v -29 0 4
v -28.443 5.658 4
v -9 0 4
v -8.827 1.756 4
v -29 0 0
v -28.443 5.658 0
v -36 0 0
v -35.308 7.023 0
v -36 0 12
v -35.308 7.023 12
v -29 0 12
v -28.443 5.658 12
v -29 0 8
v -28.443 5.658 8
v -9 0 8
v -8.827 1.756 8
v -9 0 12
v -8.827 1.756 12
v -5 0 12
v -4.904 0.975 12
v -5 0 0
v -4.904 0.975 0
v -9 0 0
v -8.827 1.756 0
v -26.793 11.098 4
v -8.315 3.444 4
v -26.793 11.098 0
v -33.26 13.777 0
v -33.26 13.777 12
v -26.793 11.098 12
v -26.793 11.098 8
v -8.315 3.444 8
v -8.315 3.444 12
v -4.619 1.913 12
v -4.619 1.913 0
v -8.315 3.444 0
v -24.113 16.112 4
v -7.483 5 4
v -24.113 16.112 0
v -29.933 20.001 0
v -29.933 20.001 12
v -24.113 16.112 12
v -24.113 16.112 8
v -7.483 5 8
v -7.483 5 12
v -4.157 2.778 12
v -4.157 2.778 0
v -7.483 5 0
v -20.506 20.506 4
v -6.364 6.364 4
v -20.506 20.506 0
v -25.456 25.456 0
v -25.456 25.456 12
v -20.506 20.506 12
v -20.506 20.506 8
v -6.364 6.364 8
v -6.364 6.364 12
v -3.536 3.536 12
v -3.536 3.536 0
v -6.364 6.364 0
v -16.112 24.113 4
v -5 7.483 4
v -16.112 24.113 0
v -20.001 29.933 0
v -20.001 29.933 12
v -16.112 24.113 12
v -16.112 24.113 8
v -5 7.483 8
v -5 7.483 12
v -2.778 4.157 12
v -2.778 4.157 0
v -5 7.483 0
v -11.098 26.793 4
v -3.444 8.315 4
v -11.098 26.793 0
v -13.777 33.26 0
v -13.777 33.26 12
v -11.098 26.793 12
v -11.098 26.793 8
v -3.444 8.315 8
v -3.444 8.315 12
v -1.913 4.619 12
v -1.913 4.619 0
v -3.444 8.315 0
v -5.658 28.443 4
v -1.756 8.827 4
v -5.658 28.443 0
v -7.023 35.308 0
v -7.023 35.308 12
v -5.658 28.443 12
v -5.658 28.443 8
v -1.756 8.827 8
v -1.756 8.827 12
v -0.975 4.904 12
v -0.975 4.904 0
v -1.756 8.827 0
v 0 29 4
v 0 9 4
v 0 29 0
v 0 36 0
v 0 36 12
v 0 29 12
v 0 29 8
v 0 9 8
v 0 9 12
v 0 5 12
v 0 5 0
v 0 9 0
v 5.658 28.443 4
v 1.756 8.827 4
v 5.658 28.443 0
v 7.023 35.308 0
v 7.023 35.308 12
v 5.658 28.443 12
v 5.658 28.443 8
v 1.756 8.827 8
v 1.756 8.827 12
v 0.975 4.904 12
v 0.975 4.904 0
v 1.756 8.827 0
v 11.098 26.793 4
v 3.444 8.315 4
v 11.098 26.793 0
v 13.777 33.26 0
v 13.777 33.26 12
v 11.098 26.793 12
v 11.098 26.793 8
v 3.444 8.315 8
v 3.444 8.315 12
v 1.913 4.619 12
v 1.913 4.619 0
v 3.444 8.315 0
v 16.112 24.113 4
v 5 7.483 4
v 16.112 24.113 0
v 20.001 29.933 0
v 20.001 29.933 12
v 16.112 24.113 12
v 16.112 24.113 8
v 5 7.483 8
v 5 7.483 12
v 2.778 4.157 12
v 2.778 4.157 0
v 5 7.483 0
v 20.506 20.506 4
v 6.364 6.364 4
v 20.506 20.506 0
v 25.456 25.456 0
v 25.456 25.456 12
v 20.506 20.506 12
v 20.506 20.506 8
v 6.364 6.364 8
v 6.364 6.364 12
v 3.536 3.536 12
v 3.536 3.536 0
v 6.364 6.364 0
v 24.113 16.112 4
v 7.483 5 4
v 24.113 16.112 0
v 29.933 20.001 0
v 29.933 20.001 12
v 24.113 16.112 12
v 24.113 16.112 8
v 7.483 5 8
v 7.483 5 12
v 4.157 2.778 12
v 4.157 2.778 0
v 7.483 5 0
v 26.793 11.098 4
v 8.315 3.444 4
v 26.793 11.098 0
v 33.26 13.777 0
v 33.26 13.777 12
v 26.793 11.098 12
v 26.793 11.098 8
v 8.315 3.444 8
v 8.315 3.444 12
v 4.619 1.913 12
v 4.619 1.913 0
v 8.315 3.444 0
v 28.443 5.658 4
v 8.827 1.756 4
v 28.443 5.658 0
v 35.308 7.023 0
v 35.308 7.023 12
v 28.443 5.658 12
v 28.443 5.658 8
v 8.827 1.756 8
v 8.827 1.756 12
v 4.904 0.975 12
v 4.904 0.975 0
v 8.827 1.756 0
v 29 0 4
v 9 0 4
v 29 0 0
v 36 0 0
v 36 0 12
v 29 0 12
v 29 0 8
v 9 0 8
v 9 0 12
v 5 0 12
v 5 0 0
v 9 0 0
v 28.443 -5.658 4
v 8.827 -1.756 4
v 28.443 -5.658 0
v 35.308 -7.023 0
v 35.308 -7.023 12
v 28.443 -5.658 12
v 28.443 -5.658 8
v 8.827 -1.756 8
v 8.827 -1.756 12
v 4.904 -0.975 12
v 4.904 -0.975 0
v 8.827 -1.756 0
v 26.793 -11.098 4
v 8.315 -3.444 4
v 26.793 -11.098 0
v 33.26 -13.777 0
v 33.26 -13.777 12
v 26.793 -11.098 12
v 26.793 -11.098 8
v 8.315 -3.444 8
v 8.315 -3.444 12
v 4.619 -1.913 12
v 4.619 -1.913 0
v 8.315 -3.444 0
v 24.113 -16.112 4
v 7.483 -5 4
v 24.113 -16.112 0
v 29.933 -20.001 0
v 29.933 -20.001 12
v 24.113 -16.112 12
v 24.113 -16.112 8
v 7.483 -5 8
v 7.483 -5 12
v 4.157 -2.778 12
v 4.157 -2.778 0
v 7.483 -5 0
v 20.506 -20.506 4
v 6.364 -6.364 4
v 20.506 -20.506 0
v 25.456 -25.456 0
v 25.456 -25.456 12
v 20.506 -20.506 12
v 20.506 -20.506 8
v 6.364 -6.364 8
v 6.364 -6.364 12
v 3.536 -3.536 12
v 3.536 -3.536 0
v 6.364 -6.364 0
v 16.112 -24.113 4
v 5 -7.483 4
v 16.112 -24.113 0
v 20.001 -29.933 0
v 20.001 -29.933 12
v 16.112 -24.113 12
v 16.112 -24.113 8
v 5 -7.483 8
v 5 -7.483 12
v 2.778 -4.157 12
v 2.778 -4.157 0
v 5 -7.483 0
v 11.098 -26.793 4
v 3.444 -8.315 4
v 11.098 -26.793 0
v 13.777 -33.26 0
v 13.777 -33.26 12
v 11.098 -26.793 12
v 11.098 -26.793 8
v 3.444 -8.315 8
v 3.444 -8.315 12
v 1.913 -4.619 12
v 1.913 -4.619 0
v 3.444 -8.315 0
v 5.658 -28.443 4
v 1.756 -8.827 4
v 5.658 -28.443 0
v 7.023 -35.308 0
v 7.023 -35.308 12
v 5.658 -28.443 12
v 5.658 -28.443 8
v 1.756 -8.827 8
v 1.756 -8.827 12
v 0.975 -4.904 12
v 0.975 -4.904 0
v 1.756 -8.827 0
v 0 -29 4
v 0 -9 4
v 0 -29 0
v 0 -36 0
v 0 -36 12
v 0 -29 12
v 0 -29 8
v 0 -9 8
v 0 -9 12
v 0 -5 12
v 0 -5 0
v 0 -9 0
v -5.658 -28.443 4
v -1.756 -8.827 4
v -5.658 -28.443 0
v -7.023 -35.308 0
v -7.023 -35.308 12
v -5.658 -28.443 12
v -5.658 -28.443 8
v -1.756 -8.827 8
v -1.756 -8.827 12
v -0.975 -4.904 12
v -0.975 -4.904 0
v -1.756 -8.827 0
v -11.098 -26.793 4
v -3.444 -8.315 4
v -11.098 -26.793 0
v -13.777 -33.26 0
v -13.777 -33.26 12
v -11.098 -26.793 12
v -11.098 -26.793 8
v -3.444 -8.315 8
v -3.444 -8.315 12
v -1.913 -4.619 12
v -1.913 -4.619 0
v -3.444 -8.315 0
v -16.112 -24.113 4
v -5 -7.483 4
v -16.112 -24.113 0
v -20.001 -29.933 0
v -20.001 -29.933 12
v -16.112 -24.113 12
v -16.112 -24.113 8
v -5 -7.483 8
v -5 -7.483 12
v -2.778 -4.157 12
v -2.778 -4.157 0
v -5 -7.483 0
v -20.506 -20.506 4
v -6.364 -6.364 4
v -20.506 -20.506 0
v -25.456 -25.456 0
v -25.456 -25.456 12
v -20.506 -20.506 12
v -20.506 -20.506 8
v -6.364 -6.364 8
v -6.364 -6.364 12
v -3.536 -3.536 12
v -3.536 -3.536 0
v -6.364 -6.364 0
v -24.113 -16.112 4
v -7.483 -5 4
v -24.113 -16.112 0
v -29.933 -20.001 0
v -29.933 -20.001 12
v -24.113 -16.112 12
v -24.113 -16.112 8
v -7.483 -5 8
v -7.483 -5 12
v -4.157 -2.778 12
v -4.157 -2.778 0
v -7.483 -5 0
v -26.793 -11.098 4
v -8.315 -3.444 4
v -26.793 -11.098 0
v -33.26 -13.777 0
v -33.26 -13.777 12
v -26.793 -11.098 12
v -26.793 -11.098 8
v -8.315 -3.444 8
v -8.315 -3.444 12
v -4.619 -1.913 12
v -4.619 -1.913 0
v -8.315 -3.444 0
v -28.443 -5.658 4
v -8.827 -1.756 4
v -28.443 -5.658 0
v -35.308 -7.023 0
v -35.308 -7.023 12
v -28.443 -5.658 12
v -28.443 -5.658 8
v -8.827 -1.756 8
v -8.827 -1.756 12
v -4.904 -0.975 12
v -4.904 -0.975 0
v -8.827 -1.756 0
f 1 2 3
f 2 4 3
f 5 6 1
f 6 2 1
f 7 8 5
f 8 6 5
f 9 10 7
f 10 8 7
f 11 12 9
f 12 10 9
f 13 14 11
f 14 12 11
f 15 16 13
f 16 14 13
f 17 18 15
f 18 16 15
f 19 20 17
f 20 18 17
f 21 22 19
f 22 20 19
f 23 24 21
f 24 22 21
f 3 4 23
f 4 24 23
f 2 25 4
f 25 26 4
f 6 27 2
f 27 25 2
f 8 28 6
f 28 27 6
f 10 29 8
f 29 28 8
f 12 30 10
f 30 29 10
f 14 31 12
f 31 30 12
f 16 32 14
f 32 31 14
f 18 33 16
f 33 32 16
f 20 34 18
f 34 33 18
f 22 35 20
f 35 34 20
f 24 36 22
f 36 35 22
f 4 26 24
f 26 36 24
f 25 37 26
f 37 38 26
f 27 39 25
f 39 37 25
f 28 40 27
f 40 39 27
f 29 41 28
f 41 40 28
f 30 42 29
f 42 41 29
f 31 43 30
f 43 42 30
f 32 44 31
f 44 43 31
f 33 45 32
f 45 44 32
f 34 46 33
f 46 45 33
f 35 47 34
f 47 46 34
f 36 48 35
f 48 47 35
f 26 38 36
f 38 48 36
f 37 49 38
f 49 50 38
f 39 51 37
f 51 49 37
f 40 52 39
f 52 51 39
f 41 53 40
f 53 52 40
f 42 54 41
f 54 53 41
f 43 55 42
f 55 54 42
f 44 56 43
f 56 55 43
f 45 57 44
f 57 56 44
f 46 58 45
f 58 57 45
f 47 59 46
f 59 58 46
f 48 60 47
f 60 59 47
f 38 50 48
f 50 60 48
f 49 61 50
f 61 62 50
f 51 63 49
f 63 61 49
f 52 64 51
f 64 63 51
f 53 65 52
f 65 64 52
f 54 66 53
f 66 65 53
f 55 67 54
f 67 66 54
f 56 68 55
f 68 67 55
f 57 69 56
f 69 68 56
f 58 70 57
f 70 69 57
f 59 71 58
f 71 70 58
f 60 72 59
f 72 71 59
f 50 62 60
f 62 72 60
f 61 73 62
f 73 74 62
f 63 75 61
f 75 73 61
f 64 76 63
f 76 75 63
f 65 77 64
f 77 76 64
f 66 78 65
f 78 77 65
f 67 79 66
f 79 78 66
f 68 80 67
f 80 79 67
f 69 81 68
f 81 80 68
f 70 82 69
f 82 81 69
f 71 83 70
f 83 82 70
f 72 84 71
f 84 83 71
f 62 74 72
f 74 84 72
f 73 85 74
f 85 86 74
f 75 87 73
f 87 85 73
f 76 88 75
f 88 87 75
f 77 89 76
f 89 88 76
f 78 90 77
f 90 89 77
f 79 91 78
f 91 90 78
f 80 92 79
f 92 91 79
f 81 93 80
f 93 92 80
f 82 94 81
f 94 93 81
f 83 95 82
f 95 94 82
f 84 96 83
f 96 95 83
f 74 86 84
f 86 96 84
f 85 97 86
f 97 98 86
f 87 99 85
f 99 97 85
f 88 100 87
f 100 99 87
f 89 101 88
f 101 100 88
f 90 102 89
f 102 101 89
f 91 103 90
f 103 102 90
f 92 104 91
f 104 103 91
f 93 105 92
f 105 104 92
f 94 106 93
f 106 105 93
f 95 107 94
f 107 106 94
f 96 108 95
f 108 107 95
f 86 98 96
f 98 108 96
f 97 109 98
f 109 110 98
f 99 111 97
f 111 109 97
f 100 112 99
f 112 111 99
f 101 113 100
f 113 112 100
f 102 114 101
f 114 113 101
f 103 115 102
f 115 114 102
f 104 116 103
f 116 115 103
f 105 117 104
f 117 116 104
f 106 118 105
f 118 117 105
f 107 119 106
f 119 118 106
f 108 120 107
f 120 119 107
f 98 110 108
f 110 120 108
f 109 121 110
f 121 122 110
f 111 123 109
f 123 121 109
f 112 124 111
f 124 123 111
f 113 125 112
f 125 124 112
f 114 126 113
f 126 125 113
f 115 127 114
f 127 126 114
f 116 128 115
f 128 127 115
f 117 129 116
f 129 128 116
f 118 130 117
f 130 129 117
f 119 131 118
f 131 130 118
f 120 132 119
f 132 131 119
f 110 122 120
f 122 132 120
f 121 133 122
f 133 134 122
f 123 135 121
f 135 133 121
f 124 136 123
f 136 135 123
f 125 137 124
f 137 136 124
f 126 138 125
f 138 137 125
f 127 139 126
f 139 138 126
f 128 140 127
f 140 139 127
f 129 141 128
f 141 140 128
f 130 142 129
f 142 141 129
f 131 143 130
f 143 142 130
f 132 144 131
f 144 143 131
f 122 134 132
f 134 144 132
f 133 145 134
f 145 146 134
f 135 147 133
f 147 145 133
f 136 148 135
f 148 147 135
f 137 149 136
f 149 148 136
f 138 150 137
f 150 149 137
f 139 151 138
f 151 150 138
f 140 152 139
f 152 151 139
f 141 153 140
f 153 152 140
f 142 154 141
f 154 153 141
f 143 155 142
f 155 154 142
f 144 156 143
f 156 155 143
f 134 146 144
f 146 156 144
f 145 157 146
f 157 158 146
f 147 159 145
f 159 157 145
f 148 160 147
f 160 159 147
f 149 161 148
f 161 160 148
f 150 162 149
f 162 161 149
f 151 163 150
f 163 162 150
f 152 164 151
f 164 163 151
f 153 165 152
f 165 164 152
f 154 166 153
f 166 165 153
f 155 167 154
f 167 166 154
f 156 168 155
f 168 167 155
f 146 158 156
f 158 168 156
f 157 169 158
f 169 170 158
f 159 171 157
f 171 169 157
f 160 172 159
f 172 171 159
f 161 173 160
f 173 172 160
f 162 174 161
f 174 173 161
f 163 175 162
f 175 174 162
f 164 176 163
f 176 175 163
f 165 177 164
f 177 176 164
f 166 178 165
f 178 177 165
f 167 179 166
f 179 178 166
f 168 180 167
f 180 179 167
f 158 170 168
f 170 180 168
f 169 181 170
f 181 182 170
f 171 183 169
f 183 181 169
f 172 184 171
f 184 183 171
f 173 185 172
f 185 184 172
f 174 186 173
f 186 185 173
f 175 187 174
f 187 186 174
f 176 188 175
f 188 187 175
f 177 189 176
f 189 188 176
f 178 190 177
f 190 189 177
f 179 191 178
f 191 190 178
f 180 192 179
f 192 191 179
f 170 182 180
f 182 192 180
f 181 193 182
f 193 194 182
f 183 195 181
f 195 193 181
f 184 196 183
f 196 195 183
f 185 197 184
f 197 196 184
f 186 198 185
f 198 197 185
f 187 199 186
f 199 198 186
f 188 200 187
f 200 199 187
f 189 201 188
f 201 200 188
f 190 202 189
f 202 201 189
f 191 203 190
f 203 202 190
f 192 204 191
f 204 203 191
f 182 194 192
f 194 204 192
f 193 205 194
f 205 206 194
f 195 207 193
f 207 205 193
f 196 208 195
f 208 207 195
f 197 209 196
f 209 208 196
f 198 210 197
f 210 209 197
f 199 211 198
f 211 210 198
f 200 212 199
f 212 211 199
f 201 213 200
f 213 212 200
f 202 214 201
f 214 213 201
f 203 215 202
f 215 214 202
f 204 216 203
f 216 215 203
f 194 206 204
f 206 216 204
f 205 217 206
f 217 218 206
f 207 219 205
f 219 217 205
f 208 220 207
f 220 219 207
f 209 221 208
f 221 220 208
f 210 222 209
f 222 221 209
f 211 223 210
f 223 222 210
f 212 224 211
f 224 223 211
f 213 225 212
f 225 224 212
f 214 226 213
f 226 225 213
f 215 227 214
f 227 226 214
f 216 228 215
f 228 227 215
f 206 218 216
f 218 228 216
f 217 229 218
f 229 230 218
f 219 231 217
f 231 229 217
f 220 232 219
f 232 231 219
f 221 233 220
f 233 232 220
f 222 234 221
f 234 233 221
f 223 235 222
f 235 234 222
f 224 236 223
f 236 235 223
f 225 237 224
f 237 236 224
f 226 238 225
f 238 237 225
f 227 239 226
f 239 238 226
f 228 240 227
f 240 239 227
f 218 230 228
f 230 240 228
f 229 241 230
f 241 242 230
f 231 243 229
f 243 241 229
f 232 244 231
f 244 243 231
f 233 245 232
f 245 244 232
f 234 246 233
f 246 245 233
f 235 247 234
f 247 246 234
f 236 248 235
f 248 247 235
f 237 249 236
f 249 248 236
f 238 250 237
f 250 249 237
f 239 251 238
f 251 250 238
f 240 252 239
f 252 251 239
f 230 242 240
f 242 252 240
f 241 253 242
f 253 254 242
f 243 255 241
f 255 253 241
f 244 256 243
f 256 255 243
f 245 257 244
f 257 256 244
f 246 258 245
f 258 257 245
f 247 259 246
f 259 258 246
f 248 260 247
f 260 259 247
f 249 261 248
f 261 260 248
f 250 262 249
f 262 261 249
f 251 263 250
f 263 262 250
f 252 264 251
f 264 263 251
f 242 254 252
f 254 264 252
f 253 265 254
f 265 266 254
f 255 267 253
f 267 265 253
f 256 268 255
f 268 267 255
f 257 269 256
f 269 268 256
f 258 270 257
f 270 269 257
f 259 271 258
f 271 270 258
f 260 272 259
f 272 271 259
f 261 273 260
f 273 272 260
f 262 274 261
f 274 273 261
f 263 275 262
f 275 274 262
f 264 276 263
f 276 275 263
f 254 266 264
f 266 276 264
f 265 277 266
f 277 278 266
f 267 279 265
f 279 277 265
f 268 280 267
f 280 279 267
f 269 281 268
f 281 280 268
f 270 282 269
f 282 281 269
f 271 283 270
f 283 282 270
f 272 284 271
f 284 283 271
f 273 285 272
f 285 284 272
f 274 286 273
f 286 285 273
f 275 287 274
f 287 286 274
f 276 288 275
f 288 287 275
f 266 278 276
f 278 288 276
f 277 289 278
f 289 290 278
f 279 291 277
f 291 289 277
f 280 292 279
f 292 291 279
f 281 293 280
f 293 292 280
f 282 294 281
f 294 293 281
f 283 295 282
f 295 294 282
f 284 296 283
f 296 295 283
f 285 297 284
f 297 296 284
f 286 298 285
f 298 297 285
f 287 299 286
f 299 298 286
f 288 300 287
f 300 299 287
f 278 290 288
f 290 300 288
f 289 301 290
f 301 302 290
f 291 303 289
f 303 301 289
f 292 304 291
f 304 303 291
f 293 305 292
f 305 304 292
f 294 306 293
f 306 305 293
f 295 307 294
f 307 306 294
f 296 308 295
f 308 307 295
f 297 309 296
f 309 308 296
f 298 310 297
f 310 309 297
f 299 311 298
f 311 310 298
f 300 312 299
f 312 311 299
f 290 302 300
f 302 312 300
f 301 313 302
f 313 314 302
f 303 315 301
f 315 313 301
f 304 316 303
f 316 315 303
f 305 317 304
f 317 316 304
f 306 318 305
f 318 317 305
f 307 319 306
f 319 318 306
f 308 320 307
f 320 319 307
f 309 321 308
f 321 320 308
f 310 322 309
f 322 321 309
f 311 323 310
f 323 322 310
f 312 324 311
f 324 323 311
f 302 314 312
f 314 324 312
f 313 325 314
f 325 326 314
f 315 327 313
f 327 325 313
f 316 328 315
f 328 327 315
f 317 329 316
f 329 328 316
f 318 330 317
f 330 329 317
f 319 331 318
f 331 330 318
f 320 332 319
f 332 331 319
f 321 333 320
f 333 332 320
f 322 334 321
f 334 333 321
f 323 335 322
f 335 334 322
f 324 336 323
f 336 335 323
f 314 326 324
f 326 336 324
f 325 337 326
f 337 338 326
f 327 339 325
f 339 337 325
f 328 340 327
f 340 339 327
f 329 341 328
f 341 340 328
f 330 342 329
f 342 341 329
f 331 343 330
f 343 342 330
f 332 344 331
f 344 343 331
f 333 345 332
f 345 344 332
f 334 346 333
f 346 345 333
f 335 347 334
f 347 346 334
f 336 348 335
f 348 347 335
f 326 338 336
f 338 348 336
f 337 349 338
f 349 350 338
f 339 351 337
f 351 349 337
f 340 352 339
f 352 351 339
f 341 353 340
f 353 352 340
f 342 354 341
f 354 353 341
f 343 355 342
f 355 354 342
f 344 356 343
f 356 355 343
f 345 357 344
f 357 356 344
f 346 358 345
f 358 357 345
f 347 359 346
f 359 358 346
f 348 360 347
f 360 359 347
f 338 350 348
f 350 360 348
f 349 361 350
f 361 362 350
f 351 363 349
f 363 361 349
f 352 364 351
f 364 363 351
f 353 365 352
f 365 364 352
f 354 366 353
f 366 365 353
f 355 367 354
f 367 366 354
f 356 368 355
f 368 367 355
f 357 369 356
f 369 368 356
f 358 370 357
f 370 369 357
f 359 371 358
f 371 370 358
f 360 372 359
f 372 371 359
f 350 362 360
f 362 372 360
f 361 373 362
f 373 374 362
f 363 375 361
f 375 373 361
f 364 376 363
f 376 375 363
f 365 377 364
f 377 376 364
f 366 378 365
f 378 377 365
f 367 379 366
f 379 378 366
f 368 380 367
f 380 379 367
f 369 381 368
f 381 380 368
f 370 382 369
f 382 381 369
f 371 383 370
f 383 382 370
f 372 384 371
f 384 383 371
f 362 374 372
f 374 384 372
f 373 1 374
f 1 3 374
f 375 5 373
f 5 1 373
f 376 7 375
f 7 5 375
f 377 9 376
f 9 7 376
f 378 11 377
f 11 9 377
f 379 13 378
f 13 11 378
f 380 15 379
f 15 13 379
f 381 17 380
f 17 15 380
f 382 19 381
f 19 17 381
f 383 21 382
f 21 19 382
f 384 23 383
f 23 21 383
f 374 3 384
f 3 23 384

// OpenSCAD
$fn = 32;

// ----------------------------------------------------------------------
// Revolved part: handwheel R36
// ----------------------------------------------------------------------

// --- parameters (mm) ---
bore_r = 5;               // bore radius
rim_r = 36;               // rim radius
rim_w = 7;                // rim axial width
rim_t = 12;               // rim diameter height
hub_r = 9;                // hub radius
web_t = 4;                // web thickness
revolve_angle = 360;      // revolve sweep, degrees
fit_tol = 0.05;           // declared fit tolerance (prompt contract)
free_tol = 0.2;           // declared free tolerance (prompt contract)

bore_d = 2 * bore_r;
rim_d = 2 * rim_r;
hub_d = 2 * hub_r;

profile = [[5, 0], [9, 0], [9, 4], [29, 4], [29, 0], [36, 0], [36, 12], [29, 12], [29, 8], [9, 8], [9, 12], [5, 12]];  // primary outline, 12 points, counter clockwise

// --- the one profile operation ---
rotate_extrude(angle = revolve_angle) polygon(points = profile);
